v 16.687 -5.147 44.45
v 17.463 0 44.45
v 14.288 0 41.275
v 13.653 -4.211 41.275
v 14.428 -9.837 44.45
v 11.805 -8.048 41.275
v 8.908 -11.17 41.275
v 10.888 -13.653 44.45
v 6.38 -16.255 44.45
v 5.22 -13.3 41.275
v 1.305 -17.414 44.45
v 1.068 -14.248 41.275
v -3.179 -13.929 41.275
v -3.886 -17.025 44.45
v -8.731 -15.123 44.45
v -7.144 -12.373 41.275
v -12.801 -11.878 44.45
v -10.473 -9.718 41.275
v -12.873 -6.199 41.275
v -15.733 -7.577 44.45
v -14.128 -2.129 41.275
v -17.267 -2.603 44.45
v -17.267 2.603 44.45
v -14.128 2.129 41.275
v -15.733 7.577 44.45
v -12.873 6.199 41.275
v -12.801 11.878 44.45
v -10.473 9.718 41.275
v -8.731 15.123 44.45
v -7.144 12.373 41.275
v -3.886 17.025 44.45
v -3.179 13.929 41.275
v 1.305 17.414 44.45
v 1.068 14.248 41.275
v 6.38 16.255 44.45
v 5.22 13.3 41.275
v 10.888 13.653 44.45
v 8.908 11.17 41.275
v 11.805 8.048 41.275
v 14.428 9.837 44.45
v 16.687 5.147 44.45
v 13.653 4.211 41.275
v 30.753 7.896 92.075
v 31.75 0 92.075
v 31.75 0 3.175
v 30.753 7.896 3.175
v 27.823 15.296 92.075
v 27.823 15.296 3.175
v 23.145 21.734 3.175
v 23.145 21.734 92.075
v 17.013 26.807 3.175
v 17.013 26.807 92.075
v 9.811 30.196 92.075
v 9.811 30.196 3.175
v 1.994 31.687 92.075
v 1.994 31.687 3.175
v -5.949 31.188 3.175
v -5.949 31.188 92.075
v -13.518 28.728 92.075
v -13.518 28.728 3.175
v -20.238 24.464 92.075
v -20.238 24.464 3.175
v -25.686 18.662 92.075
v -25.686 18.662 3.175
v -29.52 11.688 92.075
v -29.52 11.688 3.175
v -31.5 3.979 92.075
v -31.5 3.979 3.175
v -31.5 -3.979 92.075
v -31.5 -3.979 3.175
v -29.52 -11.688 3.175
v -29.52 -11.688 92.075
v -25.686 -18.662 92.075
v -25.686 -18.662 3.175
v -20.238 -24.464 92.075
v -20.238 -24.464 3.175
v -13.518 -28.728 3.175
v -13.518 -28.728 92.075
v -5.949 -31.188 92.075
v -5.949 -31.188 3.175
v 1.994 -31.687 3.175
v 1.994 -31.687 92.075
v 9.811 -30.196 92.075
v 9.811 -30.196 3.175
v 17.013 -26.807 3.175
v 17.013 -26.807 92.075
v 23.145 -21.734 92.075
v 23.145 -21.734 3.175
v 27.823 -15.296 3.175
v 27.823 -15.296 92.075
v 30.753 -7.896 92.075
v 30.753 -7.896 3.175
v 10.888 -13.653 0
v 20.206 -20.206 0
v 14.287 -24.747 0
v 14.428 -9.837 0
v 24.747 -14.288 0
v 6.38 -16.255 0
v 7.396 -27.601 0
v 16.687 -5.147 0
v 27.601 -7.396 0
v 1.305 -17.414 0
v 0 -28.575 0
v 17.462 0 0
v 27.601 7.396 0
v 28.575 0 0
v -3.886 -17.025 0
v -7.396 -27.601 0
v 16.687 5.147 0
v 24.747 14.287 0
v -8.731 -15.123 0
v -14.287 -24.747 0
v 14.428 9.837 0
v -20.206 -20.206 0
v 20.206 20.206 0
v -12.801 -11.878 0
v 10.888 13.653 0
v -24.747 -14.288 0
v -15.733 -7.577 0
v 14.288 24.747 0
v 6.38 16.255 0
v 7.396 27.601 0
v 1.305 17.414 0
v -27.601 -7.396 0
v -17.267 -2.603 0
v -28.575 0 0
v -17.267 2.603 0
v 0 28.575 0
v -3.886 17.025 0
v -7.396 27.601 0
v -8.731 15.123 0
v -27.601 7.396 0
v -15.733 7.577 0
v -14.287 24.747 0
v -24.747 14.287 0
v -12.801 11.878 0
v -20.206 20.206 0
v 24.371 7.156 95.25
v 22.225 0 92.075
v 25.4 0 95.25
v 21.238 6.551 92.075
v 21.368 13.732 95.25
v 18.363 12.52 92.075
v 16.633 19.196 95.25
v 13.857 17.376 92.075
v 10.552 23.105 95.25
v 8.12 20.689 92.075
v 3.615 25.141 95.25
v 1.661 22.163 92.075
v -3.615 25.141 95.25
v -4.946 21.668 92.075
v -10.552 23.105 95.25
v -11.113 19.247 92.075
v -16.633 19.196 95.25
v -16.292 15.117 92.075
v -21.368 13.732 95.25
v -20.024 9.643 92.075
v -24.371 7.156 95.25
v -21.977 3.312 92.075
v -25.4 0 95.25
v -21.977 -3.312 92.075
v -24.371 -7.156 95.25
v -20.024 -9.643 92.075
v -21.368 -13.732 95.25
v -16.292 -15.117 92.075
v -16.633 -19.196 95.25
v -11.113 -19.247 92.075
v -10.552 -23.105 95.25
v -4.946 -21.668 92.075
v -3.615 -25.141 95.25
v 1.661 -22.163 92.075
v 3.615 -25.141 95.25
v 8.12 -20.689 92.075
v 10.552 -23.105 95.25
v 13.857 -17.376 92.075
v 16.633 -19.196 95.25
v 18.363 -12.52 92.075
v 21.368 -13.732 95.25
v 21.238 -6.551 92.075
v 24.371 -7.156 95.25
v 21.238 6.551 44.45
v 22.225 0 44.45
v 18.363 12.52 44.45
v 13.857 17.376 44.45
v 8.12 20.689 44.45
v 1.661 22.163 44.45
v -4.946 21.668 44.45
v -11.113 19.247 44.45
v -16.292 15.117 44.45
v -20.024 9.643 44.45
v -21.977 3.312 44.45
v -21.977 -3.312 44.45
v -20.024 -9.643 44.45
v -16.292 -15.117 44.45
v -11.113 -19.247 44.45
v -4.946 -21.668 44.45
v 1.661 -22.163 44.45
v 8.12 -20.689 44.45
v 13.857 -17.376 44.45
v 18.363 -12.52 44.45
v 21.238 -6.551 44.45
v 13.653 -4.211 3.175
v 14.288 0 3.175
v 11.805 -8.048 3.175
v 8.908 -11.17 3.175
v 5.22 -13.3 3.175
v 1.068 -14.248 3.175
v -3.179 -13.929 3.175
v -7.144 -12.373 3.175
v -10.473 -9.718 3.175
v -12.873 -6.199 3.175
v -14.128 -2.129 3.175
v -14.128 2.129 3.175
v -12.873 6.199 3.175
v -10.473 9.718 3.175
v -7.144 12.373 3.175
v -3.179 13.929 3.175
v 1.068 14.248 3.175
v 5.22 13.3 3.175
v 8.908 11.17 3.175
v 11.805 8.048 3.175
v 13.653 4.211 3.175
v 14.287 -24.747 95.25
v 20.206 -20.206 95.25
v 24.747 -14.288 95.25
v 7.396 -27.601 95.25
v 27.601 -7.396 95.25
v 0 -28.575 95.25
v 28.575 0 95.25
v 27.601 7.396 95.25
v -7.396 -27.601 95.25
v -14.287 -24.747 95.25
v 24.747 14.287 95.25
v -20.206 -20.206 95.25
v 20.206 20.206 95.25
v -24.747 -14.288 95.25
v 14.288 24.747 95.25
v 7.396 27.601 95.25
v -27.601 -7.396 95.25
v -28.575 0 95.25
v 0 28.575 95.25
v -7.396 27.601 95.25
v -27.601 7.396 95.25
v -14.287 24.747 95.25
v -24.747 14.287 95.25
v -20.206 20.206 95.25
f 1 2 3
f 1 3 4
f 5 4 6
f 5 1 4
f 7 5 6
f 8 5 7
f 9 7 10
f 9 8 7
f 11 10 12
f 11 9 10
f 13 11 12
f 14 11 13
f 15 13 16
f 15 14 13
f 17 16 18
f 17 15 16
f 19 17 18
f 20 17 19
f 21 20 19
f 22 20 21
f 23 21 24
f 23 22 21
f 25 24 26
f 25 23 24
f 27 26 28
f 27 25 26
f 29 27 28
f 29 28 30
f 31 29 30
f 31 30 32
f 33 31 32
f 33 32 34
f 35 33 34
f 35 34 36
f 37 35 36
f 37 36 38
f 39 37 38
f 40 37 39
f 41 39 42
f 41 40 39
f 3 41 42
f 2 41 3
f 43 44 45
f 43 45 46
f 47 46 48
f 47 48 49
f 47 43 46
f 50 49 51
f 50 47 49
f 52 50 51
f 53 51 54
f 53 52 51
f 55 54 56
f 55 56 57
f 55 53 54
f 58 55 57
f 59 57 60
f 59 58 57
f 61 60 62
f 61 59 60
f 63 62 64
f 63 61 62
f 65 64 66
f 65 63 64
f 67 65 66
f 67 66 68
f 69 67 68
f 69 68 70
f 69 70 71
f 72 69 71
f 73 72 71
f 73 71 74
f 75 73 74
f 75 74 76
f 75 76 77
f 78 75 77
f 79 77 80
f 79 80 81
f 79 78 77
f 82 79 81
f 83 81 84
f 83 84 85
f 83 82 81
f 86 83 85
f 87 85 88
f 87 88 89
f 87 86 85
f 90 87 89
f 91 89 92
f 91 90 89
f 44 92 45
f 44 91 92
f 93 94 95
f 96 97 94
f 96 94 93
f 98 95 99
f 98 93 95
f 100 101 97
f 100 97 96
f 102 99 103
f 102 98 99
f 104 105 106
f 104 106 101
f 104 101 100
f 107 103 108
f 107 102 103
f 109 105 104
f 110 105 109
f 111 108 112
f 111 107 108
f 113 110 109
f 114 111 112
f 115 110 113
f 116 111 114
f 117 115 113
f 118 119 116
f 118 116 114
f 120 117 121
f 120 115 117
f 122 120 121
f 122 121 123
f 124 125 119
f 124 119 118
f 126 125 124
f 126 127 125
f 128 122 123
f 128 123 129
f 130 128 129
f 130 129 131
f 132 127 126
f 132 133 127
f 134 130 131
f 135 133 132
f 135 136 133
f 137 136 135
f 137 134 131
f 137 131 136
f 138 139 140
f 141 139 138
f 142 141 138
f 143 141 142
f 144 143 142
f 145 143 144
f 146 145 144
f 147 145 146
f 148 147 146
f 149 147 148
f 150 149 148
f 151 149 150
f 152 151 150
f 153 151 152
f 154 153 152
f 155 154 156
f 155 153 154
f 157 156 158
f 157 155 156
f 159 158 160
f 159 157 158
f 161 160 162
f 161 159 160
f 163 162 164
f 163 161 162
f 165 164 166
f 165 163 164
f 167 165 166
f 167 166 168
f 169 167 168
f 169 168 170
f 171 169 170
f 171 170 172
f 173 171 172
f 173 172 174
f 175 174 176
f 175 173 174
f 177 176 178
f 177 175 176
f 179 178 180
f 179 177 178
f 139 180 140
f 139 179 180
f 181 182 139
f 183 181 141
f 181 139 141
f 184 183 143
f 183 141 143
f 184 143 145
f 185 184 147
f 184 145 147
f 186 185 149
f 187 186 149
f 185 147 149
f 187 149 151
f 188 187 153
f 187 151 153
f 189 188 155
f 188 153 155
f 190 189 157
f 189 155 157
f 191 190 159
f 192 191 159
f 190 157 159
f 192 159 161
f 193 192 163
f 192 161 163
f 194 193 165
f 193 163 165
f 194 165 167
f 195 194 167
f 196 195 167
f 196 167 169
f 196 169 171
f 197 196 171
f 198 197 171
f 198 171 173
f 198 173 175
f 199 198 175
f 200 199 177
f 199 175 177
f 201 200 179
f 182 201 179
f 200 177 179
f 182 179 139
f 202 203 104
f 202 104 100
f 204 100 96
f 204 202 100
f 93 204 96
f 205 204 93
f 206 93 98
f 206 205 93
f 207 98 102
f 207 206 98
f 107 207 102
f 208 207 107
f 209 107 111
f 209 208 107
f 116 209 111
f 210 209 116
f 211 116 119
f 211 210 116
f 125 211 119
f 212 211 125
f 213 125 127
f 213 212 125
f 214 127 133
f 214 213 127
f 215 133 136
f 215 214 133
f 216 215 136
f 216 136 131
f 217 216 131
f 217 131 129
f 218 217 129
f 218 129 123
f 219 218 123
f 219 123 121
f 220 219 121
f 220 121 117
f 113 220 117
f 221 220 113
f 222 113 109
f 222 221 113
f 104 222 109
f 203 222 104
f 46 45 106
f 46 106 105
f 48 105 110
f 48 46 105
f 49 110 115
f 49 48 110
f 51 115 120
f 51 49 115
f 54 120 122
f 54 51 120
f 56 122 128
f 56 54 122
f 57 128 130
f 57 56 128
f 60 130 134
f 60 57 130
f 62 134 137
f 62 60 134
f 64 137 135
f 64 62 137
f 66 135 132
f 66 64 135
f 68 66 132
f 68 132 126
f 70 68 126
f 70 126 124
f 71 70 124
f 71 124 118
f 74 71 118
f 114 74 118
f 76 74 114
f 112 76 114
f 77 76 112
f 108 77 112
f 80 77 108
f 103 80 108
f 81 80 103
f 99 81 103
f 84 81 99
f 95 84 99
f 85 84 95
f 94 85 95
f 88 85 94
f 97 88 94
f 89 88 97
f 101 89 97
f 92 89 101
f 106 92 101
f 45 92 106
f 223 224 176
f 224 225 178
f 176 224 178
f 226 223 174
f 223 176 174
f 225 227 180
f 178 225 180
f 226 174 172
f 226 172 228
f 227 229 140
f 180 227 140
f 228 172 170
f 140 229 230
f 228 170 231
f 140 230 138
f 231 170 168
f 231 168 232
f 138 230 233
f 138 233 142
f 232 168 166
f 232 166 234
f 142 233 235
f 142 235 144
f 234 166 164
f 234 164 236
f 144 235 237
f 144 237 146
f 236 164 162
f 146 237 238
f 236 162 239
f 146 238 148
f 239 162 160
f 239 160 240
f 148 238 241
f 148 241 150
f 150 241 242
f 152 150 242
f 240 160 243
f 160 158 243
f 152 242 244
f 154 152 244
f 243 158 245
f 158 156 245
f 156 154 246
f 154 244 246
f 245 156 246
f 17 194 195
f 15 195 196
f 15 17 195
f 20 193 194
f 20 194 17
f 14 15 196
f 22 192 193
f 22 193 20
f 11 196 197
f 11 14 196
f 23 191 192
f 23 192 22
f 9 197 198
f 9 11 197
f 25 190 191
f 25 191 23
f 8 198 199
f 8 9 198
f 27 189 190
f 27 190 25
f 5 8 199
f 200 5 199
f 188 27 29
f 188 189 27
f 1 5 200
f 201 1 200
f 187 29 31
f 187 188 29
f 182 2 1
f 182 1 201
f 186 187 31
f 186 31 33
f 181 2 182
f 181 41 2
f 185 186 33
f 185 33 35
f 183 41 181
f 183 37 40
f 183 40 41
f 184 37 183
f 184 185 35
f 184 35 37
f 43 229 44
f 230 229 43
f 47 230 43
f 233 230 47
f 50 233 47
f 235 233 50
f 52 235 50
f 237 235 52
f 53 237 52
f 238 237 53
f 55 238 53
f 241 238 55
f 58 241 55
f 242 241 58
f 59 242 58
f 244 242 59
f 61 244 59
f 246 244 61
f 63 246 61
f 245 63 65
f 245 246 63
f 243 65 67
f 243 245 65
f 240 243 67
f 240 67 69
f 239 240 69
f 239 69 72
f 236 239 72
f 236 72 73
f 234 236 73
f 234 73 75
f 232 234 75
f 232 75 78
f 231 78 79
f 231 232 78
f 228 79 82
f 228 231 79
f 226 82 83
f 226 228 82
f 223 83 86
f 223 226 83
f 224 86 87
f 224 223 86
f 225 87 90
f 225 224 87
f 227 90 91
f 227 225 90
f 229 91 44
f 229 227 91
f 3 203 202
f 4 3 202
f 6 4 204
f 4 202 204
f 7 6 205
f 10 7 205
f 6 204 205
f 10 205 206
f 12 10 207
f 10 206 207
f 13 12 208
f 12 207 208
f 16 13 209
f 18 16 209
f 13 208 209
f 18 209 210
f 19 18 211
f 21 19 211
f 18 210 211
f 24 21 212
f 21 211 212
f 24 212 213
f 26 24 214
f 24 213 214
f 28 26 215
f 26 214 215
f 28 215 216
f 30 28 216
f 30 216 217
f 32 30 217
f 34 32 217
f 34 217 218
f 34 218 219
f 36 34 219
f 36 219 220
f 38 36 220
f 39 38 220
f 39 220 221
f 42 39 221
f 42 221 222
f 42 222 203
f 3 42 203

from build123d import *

# Parameters (mm, degrees)
F0_W     = 31.75
F0_H     = 95.25
F2_R     = 22.225
F3_DEPTH = 50.8
F4_R     = 14.2875
F5_DEPTH = 95.251
F6_SIZE  = 3.175


with BuildPart() as f1:
    # F0 (on Front) → F1 (revolve)
    with BuildSketch(Plane.XZ):
        with Locations((15.875, 47.625)):
            Rectangle(F0_W, F0_H)
    revolve(axis=Axis((0, 0, 30.3924912523), (0, 0, 1)))

    # F2 (on face) → F3 (cut)
    with BuildSketch(Plane.XY.offset(95.25)):
        Circle(F2_R)
    extrude(amount=-F3_DEPTH, mode=Mode.SUBTRACT)

    # F4 (on face) → F5 (cut, through all)
    with BuildSketch(Plane(origin=(0, 0, 0), x_dir=(1, 0, 0), z_dir=(0, 0, -1))):
        Circle(F4_R)
    extrude(amount=-F5_DEPTH, mode=Mode.SUBTRACT)

    # F6
    f6_edges = [f1.edges().sort_by_distance(p)[0] for p in [
        (-31.75, 0, 0),
        (-31.75, 0, 95.25),
        (-22.225, 0, 95.25),
        (-14.2875, 0, 44.45),
        (-14.2875, 0, 0),
        (14.2875, 0, 22.225),
    ]]
    chamfer(f6_edges, length=F6_SIZE)


solid = f1.part
